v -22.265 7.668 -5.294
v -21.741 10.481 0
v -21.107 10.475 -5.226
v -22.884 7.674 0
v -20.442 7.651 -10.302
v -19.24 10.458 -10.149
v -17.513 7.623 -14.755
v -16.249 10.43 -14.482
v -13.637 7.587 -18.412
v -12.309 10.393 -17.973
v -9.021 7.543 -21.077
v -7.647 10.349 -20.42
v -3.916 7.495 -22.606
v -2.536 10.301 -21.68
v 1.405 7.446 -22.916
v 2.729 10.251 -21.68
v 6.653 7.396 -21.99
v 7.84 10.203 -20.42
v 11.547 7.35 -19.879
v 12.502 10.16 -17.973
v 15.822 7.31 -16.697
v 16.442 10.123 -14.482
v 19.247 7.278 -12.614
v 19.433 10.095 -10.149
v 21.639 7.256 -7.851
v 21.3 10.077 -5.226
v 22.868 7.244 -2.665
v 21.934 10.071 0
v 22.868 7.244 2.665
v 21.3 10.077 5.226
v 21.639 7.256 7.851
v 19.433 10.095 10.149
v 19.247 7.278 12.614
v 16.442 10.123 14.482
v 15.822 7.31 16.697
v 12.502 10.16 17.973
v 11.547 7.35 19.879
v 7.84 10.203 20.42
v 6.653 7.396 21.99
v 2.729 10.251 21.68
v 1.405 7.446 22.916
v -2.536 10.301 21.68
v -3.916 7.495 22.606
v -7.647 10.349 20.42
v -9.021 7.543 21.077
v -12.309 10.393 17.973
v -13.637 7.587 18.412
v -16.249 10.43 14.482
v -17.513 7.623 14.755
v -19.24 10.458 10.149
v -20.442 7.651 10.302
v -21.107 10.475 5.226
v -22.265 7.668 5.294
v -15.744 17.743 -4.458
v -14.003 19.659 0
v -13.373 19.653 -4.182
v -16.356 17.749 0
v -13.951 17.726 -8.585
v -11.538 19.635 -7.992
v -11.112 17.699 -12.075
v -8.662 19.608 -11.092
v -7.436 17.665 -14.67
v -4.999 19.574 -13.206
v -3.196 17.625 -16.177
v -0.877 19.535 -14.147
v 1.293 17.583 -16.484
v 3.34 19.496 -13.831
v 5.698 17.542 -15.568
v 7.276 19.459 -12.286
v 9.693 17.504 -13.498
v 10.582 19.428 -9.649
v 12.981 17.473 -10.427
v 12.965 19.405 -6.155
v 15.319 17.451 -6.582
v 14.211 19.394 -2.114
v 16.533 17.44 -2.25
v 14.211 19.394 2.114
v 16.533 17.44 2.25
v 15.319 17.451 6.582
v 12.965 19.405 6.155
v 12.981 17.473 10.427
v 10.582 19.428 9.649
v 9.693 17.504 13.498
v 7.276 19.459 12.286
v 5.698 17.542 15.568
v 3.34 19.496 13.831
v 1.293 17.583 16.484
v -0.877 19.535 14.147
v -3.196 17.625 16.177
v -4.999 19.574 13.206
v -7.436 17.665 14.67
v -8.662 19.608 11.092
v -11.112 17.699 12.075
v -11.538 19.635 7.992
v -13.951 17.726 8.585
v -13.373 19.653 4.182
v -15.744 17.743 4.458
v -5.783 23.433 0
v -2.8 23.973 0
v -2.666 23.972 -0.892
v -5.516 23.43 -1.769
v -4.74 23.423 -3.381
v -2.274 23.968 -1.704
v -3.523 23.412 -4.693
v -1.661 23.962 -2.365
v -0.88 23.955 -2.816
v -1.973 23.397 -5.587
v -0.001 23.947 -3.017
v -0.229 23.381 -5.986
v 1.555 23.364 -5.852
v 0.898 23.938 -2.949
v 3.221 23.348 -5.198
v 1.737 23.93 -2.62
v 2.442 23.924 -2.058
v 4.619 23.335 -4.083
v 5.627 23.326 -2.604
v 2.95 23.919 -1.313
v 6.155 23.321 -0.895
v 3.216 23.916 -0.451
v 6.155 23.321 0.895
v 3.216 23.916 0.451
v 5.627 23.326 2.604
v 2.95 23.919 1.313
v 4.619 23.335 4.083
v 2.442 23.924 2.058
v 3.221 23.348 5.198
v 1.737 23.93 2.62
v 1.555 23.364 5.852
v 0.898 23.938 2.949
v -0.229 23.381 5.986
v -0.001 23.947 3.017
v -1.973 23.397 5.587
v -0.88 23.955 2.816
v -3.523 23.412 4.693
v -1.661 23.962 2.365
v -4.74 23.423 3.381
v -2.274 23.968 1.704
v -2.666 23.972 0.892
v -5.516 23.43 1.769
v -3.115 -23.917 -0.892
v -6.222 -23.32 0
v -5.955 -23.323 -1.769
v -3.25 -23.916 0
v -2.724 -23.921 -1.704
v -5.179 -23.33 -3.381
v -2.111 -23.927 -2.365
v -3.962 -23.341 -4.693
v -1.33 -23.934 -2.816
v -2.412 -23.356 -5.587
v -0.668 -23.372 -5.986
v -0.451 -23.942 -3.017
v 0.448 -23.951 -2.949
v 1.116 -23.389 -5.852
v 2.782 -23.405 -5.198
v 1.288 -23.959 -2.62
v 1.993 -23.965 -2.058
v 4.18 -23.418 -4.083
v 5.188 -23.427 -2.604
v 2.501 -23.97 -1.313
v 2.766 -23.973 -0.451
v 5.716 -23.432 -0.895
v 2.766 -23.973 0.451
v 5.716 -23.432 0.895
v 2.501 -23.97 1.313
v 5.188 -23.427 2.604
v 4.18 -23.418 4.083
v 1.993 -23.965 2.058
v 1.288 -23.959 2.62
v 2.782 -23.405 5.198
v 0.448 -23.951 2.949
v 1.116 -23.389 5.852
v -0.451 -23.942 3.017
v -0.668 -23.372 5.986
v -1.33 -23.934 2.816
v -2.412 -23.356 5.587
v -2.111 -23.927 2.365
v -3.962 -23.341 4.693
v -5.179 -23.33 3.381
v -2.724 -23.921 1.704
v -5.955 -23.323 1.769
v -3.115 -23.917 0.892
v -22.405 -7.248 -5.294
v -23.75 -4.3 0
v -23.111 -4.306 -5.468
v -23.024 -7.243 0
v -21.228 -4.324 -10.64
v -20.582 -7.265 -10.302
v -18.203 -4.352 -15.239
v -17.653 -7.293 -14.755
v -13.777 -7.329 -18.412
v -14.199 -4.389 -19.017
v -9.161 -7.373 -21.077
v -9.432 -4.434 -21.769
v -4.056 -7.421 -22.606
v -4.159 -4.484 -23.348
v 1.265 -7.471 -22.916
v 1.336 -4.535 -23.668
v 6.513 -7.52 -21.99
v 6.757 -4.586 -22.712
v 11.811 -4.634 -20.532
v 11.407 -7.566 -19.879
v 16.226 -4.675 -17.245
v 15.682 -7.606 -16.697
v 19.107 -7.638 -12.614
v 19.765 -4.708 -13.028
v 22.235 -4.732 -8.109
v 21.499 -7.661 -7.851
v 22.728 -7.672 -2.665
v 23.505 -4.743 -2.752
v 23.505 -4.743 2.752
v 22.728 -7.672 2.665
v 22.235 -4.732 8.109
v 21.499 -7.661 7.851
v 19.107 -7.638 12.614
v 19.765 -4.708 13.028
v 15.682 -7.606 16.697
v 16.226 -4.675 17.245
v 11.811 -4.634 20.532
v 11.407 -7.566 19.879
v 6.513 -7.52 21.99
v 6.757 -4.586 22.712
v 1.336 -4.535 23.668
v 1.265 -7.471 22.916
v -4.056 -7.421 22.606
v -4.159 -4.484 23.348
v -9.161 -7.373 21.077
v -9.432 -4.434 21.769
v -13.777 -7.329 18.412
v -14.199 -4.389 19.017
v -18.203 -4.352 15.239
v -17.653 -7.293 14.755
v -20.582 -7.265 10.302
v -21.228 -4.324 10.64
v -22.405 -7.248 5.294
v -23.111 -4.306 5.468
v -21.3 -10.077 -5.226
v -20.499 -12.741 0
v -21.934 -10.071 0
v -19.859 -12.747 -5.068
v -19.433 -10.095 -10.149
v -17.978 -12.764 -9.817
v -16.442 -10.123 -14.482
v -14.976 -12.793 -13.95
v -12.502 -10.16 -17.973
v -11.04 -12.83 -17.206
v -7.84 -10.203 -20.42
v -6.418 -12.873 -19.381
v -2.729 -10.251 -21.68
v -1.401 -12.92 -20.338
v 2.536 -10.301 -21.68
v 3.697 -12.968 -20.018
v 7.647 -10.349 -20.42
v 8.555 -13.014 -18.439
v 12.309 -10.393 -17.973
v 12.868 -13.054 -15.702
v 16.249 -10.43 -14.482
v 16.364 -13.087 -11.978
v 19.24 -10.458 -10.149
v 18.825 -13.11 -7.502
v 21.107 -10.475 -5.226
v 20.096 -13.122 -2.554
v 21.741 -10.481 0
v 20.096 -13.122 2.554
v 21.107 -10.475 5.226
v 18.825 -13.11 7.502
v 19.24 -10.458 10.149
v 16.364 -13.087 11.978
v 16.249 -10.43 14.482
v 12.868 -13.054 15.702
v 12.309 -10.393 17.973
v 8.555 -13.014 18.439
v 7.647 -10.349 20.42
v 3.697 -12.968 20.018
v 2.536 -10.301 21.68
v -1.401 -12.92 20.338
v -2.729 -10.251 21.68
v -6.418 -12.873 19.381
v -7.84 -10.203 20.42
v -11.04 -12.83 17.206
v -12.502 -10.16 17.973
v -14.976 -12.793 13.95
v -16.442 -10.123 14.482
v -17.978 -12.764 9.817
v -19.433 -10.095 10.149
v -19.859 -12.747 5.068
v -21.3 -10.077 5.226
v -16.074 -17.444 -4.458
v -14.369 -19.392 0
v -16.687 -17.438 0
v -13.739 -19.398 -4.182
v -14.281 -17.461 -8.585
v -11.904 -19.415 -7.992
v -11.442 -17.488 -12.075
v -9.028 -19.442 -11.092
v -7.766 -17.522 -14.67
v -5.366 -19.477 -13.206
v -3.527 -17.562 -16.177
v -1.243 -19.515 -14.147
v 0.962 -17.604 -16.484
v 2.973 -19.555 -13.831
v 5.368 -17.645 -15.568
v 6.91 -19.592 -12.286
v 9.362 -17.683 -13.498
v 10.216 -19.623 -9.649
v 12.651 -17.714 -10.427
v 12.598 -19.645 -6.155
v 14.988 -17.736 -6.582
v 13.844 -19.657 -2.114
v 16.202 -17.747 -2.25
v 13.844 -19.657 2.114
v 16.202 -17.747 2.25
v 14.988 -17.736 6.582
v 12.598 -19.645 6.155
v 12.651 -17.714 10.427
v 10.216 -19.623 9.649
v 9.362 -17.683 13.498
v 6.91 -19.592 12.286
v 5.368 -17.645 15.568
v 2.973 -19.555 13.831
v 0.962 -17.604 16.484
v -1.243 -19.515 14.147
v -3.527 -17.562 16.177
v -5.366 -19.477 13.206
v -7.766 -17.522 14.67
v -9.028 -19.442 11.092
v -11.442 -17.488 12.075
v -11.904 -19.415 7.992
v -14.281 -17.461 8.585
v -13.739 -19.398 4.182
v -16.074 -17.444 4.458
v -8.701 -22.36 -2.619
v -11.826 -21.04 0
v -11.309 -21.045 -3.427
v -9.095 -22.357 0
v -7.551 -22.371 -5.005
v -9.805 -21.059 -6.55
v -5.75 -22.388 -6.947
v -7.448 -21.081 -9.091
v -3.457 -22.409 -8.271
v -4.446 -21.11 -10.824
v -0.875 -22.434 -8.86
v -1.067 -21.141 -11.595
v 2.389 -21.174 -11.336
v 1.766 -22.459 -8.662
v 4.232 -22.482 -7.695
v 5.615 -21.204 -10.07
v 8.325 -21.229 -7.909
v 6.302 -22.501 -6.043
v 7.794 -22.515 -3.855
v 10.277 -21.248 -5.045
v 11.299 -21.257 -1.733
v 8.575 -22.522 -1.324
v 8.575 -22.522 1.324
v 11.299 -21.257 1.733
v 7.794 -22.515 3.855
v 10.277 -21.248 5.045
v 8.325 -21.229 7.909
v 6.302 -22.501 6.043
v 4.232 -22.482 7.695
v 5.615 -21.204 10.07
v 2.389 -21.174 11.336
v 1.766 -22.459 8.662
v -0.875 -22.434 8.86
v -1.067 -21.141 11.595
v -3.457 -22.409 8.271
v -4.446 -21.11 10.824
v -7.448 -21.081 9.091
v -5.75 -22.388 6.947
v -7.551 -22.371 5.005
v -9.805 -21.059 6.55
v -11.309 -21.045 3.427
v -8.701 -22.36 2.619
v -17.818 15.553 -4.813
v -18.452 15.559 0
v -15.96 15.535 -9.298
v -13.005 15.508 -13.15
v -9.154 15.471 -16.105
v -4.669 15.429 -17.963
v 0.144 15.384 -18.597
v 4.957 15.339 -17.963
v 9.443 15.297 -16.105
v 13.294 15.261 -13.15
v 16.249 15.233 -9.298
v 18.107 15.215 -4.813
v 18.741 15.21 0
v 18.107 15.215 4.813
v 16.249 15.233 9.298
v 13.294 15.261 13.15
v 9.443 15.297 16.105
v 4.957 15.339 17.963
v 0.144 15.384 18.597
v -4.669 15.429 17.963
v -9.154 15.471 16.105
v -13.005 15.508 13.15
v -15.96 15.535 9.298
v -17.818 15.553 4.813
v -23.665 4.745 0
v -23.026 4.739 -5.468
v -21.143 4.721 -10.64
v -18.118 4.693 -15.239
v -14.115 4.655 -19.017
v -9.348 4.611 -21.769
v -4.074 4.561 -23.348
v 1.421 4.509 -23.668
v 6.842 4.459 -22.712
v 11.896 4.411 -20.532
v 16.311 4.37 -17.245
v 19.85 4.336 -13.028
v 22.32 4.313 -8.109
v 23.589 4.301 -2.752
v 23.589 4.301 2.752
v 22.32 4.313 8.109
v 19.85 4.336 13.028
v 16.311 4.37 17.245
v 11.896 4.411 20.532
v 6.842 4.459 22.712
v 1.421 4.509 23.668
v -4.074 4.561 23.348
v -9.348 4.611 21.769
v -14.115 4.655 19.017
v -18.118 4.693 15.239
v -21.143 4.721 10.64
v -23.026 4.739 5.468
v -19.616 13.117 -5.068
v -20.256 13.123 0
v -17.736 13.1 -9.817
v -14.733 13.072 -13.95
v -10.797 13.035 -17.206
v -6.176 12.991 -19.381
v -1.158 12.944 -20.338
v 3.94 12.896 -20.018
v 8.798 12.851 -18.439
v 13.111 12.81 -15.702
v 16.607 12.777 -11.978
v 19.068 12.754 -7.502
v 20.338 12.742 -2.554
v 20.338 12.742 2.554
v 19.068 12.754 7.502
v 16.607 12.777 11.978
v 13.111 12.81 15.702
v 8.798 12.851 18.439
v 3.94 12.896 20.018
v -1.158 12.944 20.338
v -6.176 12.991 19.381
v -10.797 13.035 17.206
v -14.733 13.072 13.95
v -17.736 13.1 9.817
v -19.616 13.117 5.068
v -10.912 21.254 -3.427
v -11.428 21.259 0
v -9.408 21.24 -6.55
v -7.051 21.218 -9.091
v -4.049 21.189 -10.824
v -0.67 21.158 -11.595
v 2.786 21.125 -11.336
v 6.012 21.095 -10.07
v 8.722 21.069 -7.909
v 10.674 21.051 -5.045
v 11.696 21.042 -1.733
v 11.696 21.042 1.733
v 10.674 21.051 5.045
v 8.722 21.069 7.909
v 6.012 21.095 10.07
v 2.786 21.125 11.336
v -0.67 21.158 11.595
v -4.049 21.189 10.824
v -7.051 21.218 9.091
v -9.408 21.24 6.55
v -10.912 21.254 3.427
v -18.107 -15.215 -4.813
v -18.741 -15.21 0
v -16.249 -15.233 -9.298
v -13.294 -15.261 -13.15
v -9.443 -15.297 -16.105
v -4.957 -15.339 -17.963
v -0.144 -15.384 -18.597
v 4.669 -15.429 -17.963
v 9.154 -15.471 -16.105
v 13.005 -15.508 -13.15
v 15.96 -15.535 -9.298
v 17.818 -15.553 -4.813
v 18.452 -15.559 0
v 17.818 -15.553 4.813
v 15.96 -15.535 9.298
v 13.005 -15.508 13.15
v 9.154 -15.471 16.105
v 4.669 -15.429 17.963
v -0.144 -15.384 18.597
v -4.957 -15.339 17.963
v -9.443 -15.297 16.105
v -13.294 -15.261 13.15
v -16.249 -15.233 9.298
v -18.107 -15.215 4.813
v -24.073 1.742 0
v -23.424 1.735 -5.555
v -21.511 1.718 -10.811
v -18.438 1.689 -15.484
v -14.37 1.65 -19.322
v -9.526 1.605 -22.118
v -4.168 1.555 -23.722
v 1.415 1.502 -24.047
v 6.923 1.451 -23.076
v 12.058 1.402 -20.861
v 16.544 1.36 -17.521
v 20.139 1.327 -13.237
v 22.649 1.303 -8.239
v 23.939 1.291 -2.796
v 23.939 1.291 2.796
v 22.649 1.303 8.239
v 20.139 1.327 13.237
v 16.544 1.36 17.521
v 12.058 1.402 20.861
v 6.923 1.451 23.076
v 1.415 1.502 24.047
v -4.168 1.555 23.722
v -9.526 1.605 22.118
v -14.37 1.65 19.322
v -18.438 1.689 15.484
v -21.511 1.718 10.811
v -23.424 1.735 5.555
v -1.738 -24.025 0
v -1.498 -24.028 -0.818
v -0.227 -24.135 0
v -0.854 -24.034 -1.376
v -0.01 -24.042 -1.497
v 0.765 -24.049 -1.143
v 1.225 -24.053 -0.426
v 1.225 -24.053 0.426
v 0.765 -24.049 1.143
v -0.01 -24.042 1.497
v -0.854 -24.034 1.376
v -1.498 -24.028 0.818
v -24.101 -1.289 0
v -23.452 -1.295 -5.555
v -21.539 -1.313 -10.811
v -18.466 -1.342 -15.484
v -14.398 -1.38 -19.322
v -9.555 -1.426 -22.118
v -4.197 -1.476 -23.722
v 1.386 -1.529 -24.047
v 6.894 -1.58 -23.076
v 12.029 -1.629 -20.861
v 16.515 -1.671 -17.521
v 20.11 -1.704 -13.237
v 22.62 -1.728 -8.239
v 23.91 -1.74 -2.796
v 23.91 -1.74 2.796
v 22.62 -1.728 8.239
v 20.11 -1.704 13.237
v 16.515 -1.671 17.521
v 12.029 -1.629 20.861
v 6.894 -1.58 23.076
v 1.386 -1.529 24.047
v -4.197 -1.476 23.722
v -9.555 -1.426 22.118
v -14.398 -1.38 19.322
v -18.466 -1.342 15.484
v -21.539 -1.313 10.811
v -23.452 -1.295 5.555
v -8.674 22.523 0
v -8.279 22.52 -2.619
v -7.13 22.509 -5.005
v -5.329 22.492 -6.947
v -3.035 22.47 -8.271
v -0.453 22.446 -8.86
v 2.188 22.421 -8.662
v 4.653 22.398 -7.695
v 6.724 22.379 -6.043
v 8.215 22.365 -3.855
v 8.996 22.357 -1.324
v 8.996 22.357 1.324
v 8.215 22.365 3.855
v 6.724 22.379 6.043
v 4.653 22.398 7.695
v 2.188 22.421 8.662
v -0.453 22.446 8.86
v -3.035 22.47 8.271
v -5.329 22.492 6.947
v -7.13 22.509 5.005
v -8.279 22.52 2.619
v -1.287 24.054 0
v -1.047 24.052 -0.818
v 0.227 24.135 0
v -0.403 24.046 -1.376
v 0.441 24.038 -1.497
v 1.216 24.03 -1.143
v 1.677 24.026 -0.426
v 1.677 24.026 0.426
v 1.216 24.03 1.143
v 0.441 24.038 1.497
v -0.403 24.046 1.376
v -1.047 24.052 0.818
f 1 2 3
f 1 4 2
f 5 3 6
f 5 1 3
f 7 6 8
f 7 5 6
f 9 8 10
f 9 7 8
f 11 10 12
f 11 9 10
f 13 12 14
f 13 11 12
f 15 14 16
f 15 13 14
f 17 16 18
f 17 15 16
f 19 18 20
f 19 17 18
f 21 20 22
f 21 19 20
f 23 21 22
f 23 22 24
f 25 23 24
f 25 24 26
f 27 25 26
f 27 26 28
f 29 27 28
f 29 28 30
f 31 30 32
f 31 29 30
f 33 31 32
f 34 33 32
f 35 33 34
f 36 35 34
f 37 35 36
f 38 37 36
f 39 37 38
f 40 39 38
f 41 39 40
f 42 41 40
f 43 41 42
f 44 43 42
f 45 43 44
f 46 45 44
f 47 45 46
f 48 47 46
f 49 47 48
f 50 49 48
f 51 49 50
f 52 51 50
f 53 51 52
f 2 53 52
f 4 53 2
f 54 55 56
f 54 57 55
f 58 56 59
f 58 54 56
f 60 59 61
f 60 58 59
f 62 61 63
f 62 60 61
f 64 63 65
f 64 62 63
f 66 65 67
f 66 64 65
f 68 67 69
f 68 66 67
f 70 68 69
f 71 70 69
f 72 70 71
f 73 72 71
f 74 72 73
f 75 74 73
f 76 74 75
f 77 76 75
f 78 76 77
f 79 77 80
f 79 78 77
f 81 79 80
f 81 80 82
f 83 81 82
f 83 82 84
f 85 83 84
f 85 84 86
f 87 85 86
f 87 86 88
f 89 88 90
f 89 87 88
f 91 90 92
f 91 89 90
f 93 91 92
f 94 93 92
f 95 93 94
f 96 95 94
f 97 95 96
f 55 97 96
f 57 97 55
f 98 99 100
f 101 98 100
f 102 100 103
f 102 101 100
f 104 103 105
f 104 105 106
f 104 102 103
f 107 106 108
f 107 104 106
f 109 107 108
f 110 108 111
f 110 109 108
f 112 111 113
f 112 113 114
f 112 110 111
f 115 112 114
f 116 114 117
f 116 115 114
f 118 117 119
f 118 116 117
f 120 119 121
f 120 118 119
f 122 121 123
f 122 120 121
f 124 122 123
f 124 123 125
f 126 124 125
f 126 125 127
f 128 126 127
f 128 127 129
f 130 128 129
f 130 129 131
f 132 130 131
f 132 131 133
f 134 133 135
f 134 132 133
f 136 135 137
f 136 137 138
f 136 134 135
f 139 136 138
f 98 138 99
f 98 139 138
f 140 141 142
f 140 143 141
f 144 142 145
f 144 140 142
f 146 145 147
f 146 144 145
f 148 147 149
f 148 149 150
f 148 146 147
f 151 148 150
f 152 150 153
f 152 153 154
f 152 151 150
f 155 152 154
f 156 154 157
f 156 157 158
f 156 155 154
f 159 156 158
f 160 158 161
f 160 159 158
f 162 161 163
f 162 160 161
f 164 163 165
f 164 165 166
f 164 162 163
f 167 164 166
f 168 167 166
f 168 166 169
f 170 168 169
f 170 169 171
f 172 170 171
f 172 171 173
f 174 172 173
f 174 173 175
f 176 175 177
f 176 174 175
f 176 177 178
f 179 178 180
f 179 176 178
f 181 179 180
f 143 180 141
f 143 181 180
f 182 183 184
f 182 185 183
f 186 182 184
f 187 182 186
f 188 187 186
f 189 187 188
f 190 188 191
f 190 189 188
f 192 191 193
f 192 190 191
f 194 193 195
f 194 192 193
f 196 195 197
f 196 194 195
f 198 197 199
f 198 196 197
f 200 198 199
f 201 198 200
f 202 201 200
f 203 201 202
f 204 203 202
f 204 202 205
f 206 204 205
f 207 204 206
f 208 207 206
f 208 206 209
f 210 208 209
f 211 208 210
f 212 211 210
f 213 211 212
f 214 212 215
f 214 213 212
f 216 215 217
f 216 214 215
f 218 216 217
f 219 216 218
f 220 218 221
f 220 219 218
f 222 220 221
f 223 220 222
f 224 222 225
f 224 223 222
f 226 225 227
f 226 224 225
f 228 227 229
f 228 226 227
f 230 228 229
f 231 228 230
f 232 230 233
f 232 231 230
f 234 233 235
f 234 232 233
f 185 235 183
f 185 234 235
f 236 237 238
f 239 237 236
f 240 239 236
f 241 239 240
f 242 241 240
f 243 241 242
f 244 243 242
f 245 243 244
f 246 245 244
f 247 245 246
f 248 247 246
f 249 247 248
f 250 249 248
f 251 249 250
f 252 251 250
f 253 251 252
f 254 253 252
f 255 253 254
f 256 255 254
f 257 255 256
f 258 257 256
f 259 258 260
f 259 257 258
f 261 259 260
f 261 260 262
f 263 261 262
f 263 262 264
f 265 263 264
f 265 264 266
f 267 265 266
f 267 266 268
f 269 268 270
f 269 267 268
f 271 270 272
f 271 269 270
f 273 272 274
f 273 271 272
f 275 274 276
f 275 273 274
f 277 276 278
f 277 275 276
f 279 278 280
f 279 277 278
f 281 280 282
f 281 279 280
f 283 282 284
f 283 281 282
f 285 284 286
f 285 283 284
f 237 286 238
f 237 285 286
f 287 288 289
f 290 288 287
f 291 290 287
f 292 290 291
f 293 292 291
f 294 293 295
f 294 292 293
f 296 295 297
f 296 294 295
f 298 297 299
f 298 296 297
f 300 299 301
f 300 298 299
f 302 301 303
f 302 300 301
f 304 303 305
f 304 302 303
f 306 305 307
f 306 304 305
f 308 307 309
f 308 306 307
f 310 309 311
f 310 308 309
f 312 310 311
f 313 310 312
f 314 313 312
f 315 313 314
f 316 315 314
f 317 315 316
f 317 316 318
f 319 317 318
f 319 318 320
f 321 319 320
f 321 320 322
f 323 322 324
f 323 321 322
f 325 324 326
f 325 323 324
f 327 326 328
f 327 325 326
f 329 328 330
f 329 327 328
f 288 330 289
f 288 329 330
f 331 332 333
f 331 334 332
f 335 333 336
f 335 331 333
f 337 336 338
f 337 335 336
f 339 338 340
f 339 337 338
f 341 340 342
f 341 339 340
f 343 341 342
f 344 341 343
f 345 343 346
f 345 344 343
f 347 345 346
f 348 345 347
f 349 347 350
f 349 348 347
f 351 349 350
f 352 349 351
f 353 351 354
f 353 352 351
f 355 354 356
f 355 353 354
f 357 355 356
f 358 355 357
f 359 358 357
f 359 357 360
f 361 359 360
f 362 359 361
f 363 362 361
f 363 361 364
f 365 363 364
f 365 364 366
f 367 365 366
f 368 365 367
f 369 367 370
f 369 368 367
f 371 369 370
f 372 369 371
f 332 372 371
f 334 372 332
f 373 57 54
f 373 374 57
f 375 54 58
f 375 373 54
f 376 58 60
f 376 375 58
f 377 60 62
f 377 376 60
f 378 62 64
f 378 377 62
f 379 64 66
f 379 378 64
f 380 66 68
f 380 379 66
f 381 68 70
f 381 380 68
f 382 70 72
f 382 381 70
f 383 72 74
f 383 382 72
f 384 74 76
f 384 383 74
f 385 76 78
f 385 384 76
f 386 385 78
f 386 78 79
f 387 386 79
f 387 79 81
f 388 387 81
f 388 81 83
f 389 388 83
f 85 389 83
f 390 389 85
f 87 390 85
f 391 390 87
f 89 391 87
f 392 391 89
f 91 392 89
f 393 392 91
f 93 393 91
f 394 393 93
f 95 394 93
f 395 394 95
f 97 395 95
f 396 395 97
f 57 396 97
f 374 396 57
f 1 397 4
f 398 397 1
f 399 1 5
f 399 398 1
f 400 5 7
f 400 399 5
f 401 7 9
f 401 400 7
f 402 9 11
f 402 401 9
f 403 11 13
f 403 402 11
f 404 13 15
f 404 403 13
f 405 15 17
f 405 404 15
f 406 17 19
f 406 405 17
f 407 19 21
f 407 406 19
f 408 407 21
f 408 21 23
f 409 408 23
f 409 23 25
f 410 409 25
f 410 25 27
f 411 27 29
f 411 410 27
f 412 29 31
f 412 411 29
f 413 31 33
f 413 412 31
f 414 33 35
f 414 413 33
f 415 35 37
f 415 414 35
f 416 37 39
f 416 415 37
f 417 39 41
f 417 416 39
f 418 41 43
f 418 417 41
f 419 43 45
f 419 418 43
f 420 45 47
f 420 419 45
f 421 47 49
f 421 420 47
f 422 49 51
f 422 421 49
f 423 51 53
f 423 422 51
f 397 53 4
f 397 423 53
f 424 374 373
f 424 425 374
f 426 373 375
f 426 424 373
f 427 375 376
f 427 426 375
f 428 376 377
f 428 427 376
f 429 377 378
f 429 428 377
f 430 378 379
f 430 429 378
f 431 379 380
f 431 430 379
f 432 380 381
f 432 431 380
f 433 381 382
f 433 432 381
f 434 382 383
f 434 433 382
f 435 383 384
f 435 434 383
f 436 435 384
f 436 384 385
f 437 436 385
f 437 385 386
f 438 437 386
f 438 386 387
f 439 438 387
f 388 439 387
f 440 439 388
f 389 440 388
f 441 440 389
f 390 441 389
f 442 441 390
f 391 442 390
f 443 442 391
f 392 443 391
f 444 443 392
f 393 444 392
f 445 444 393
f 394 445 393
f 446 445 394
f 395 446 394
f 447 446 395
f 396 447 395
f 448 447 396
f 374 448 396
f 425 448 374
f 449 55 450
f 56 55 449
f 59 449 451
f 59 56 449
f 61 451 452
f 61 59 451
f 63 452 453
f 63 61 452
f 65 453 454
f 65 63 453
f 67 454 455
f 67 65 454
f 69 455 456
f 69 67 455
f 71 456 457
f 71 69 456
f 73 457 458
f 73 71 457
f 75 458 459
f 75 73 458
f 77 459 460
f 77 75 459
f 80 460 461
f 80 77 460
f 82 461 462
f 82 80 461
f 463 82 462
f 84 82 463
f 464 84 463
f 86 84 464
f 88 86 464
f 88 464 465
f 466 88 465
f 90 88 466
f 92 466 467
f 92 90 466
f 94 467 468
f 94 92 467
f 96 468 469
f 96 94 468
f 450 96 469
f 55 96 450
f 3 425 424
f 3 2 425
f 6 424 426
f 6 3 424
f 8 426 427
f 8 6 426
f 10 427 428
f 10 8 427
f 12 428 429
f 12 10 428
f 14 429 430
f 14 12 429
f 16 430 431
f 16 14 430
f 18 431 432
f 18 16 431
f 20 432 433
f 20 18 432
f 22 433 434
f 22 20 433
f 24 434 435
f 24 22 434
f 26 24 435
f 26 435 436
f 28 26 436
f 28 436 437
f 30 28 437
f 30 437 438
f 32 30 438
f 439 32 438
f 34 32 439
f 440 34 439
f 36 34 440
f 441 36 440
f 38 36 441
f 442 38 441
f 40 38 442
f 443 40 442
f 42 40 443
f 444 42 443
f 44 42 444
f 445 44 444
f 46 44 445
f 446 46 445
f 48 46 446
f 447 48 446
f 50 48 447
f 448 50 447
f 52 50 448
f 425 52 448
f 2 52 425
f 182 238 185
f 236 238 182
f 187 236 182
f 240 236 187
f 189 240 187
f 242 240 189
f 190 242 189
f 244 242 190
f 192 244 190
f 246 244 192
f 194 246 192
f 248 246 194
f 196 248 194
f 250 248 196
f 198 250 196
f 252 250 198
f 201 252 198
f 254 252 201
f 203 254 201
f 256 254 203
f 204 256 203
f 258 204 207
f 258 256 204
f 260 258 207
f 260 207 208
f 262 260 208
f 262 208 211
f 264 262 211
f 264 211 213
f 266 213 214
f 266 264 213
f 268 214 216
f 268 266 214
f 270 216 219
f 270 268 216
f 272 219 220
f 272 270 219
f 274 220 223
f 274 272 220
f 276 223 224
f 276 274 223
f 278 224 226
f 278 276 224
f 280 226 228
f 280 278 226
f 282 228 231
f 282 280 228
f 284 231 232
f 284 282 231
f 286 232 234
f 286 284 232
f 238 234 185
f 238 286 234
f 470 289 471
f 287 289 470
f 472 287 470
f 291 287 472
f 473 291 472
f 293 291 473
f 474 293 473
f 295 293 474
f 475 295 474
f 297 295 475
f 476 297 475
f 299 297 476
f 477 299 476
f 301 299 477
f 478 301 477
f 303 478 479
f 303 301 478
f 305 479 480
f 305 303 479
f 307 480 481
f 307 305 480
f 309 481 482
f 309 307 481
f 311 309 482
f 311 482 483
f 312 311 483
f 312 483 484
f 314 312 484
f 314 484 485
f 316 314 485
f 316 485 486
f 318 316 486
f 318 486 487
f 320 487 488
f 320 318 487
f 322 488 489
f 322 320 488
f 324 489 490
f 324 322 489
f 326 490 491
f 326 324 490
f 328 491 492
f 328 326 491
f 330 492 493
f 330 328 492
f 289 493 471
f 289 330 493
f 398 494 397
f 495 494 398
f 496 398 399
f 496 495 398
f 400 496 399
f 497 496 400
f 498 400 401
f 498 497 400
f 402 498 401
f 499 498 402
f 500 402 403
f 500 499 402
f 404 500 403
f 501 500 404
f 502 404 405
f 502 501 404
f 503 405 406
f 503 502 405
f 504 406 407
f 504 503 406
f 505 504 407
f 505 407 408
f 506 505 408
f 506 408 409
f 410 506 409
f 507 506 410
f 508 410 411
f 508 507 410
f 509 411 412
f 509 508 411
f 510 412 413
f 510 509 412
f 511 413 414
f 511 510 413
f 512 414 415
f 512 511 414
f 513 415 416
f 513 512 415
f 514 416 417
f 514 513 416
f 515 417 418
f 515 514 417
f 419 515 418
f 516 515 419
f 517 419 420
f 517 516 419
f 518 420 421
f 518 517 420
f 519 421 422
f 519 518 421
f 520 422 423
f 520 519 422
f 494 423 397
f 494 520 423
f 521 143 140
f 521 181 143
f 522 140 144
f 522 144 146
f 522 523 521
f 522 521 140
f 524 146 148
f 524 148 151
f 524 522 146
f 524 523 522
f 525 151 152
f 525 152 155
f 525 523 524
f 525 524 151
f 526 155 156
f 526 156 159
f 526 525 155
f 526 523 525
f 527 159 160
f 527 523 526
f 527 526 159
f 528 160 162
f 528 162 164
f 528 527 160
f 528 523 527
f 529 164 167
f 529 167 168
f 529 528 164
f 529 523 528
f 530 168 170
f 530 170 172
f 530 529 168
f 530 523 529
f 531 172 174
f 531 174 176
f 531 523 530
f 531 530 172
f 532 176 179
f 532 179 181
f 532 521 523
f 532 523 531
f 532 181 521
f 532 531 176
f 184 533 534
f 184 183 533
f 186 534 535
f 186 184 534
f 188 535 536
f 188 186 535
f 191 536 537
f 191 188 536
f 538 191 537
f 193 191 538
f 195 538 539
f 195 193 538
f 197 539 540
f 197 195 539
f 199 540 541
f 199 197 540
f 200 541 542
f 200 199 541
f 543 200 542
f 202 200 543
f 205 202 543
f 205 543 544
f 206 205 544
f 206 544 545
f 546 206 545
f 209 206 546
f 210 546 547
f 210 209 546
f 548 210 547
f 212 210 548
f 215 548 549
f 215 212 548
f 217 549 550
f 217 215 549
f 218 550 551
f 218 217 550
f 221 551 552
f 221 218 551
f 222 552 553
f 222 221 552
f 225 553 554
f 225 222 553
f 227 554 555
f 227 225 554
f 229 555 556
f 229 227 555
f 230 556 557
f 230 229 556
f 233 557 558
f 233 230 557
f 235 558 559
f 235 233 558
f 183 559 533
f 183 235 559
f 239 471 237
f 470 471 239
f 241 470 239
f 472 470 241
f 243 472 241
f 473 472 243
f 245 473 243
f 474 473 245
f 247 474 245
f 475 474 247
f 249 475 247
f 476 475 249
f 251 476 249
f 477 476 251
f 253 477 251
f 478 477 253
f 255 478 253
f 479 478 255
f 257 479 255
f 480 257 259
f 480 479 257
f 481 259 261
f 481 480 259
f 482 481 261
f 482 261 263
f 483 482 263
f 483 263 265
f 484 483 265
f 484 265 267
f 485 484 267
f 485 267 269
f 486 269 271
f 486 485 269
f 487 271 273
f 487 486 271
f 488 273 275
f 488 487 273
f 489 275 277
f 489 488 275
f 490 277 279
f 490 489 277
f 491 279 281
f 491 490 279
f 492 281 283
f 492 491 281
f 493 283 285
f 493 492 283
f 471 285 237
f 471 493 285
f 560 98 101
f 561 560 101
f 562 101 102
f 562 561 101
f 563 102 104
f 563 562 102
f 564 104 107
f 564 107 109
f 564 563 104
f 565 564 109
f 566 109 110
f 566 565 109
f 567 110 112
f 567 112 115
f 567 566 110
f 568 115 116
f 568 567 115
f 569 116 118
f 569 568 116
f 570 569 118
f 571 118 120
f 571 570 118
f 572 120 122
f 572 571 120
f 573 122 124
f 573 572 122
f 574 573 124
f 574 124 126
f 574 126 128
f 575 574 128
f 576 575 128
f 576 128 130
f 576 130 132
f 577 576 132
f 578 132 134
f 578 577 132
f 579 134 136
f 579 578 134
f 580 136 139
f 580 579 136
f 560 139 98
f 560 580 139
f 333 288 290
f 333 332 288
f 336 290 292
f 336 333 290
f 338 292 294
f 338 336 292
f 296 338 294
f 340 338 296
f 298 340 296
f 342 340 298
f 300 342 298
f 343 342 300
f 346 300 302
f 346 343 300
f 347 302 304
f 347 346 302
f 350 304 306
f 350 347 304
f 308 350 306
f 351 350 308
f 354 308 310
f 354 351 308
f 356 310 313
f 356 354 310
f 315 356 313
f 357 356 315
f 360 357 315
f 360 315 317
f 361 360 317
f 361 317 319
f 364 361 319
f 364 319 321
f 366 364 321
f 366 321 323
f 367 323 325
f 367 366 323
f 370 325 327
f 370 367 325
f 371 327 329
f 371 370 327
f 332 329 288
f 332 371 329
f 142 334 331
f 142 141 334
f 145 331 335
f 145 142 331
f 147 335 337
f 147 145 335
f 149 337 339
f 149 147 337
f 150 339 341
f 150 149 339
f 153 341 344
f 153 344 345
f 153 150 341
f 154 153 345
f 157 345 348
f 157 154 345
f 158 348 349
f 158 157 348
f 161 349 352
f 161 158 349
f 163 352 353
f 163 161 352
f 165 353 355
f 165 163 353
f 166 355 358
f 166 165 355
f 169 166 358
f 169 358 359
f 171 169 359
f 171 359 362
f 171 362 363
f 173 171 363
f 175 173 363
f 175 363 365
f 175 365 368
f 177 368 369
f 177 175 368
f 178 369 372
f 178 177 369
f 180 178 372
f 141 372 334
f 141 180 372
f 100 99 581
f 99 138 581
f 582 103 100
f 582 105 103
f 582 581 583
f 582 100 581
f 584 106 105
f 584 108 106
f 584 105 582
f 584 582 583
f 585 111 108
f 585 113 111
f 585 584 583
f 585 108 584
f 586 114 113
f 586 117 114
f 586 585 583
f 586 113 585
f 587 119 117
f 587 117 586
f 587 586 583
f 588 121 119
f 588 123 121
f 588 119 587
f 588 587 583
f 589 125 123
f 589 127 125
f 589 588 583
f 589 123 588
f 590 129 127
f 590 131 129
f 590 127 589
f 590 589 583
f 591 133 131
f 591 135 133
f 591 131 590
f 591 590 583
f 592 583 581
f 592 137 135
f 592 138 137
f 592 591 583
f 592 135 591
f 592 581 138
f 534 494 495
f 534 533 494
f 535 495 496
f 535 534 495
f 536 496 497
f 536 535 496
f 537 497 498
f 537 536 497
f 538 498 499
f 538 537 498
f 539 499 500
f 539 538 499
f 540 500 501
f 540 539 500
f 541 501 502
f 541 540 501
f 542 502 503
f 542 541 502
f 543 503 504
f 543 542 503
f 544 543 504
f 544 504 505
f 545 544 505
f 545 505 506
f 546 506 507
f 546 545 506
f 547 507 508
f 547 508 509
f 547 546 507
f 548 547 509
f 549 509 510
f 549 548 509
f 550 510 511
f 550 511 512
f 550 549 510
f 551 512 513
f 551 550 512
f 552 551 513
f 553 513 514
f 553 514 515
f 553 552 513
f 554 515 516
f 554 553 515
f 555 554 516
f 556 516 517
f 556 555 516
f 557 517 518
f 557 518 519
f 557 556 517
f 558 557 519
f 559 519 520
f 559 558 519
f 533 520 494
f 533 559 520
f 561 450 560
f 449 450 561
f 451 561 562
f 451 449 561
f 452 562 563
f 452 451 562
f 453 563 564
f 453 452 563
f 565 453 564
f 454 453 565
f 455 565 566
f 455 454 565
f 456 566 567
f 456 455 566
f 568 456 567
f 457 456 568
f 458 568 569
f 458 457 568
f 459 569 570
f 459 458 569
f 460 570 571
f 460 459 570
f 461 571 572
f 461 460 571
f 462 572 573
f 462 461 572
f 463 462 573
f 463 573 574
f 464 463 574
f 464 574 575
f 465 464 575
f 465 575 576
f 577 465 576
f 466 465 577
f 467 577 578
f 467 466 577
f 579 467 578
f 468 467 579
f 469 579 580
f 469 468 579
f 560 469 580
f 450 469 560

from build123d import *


with BuildPart() as f1:
    # F0 (on Top) → F1 (revolve)
    with BuildSketch(Plane.XY):
        Polygon((-20.2562586445, 13.1233732631), (-21.7413268012, 10.4811091493), (-22.8835212465, 7.6735516831), (-23.6648288919, 4.744977723), (-24.0729280489, 1.7415726296), (-24.1013827502, -1.2892981045), (-23.749744248, -4.2998358373), (-23.0235580916, -7.2425625904), (-21.9342766705, -10.0710698049), (-20.4990786034, -12.7407502324), (-18.7405978212, -15.2095014178), (-16.6865666162, -17.4383896801), (-14.3693782877, -19.39226412), (-11.8255762797, -21.0403109703), (-9.0952778695, -22.3565395478), (-6.221541494, -23.3201921414), (-3.2496876926, -23.9160713742), (-0.226584375, -24.1347798746), (0.226584375, 24.1347798746), (-2.8000923135, 23.972868479), (-5.7826098735, 23.4328906267), (-8.6739322215, 22.5233620912), (-11.4284614768, 21.2586266807), (-14.0027570675, 19.6586300281), (-16.3562208145, 17.7486050365), (-18.4517371885, 15.5586739409), align=None)
    revolve(axis=Axis((0, 0, 0), (-0.0093878789, -0.9999559329, 0)))


solid = f1.part
